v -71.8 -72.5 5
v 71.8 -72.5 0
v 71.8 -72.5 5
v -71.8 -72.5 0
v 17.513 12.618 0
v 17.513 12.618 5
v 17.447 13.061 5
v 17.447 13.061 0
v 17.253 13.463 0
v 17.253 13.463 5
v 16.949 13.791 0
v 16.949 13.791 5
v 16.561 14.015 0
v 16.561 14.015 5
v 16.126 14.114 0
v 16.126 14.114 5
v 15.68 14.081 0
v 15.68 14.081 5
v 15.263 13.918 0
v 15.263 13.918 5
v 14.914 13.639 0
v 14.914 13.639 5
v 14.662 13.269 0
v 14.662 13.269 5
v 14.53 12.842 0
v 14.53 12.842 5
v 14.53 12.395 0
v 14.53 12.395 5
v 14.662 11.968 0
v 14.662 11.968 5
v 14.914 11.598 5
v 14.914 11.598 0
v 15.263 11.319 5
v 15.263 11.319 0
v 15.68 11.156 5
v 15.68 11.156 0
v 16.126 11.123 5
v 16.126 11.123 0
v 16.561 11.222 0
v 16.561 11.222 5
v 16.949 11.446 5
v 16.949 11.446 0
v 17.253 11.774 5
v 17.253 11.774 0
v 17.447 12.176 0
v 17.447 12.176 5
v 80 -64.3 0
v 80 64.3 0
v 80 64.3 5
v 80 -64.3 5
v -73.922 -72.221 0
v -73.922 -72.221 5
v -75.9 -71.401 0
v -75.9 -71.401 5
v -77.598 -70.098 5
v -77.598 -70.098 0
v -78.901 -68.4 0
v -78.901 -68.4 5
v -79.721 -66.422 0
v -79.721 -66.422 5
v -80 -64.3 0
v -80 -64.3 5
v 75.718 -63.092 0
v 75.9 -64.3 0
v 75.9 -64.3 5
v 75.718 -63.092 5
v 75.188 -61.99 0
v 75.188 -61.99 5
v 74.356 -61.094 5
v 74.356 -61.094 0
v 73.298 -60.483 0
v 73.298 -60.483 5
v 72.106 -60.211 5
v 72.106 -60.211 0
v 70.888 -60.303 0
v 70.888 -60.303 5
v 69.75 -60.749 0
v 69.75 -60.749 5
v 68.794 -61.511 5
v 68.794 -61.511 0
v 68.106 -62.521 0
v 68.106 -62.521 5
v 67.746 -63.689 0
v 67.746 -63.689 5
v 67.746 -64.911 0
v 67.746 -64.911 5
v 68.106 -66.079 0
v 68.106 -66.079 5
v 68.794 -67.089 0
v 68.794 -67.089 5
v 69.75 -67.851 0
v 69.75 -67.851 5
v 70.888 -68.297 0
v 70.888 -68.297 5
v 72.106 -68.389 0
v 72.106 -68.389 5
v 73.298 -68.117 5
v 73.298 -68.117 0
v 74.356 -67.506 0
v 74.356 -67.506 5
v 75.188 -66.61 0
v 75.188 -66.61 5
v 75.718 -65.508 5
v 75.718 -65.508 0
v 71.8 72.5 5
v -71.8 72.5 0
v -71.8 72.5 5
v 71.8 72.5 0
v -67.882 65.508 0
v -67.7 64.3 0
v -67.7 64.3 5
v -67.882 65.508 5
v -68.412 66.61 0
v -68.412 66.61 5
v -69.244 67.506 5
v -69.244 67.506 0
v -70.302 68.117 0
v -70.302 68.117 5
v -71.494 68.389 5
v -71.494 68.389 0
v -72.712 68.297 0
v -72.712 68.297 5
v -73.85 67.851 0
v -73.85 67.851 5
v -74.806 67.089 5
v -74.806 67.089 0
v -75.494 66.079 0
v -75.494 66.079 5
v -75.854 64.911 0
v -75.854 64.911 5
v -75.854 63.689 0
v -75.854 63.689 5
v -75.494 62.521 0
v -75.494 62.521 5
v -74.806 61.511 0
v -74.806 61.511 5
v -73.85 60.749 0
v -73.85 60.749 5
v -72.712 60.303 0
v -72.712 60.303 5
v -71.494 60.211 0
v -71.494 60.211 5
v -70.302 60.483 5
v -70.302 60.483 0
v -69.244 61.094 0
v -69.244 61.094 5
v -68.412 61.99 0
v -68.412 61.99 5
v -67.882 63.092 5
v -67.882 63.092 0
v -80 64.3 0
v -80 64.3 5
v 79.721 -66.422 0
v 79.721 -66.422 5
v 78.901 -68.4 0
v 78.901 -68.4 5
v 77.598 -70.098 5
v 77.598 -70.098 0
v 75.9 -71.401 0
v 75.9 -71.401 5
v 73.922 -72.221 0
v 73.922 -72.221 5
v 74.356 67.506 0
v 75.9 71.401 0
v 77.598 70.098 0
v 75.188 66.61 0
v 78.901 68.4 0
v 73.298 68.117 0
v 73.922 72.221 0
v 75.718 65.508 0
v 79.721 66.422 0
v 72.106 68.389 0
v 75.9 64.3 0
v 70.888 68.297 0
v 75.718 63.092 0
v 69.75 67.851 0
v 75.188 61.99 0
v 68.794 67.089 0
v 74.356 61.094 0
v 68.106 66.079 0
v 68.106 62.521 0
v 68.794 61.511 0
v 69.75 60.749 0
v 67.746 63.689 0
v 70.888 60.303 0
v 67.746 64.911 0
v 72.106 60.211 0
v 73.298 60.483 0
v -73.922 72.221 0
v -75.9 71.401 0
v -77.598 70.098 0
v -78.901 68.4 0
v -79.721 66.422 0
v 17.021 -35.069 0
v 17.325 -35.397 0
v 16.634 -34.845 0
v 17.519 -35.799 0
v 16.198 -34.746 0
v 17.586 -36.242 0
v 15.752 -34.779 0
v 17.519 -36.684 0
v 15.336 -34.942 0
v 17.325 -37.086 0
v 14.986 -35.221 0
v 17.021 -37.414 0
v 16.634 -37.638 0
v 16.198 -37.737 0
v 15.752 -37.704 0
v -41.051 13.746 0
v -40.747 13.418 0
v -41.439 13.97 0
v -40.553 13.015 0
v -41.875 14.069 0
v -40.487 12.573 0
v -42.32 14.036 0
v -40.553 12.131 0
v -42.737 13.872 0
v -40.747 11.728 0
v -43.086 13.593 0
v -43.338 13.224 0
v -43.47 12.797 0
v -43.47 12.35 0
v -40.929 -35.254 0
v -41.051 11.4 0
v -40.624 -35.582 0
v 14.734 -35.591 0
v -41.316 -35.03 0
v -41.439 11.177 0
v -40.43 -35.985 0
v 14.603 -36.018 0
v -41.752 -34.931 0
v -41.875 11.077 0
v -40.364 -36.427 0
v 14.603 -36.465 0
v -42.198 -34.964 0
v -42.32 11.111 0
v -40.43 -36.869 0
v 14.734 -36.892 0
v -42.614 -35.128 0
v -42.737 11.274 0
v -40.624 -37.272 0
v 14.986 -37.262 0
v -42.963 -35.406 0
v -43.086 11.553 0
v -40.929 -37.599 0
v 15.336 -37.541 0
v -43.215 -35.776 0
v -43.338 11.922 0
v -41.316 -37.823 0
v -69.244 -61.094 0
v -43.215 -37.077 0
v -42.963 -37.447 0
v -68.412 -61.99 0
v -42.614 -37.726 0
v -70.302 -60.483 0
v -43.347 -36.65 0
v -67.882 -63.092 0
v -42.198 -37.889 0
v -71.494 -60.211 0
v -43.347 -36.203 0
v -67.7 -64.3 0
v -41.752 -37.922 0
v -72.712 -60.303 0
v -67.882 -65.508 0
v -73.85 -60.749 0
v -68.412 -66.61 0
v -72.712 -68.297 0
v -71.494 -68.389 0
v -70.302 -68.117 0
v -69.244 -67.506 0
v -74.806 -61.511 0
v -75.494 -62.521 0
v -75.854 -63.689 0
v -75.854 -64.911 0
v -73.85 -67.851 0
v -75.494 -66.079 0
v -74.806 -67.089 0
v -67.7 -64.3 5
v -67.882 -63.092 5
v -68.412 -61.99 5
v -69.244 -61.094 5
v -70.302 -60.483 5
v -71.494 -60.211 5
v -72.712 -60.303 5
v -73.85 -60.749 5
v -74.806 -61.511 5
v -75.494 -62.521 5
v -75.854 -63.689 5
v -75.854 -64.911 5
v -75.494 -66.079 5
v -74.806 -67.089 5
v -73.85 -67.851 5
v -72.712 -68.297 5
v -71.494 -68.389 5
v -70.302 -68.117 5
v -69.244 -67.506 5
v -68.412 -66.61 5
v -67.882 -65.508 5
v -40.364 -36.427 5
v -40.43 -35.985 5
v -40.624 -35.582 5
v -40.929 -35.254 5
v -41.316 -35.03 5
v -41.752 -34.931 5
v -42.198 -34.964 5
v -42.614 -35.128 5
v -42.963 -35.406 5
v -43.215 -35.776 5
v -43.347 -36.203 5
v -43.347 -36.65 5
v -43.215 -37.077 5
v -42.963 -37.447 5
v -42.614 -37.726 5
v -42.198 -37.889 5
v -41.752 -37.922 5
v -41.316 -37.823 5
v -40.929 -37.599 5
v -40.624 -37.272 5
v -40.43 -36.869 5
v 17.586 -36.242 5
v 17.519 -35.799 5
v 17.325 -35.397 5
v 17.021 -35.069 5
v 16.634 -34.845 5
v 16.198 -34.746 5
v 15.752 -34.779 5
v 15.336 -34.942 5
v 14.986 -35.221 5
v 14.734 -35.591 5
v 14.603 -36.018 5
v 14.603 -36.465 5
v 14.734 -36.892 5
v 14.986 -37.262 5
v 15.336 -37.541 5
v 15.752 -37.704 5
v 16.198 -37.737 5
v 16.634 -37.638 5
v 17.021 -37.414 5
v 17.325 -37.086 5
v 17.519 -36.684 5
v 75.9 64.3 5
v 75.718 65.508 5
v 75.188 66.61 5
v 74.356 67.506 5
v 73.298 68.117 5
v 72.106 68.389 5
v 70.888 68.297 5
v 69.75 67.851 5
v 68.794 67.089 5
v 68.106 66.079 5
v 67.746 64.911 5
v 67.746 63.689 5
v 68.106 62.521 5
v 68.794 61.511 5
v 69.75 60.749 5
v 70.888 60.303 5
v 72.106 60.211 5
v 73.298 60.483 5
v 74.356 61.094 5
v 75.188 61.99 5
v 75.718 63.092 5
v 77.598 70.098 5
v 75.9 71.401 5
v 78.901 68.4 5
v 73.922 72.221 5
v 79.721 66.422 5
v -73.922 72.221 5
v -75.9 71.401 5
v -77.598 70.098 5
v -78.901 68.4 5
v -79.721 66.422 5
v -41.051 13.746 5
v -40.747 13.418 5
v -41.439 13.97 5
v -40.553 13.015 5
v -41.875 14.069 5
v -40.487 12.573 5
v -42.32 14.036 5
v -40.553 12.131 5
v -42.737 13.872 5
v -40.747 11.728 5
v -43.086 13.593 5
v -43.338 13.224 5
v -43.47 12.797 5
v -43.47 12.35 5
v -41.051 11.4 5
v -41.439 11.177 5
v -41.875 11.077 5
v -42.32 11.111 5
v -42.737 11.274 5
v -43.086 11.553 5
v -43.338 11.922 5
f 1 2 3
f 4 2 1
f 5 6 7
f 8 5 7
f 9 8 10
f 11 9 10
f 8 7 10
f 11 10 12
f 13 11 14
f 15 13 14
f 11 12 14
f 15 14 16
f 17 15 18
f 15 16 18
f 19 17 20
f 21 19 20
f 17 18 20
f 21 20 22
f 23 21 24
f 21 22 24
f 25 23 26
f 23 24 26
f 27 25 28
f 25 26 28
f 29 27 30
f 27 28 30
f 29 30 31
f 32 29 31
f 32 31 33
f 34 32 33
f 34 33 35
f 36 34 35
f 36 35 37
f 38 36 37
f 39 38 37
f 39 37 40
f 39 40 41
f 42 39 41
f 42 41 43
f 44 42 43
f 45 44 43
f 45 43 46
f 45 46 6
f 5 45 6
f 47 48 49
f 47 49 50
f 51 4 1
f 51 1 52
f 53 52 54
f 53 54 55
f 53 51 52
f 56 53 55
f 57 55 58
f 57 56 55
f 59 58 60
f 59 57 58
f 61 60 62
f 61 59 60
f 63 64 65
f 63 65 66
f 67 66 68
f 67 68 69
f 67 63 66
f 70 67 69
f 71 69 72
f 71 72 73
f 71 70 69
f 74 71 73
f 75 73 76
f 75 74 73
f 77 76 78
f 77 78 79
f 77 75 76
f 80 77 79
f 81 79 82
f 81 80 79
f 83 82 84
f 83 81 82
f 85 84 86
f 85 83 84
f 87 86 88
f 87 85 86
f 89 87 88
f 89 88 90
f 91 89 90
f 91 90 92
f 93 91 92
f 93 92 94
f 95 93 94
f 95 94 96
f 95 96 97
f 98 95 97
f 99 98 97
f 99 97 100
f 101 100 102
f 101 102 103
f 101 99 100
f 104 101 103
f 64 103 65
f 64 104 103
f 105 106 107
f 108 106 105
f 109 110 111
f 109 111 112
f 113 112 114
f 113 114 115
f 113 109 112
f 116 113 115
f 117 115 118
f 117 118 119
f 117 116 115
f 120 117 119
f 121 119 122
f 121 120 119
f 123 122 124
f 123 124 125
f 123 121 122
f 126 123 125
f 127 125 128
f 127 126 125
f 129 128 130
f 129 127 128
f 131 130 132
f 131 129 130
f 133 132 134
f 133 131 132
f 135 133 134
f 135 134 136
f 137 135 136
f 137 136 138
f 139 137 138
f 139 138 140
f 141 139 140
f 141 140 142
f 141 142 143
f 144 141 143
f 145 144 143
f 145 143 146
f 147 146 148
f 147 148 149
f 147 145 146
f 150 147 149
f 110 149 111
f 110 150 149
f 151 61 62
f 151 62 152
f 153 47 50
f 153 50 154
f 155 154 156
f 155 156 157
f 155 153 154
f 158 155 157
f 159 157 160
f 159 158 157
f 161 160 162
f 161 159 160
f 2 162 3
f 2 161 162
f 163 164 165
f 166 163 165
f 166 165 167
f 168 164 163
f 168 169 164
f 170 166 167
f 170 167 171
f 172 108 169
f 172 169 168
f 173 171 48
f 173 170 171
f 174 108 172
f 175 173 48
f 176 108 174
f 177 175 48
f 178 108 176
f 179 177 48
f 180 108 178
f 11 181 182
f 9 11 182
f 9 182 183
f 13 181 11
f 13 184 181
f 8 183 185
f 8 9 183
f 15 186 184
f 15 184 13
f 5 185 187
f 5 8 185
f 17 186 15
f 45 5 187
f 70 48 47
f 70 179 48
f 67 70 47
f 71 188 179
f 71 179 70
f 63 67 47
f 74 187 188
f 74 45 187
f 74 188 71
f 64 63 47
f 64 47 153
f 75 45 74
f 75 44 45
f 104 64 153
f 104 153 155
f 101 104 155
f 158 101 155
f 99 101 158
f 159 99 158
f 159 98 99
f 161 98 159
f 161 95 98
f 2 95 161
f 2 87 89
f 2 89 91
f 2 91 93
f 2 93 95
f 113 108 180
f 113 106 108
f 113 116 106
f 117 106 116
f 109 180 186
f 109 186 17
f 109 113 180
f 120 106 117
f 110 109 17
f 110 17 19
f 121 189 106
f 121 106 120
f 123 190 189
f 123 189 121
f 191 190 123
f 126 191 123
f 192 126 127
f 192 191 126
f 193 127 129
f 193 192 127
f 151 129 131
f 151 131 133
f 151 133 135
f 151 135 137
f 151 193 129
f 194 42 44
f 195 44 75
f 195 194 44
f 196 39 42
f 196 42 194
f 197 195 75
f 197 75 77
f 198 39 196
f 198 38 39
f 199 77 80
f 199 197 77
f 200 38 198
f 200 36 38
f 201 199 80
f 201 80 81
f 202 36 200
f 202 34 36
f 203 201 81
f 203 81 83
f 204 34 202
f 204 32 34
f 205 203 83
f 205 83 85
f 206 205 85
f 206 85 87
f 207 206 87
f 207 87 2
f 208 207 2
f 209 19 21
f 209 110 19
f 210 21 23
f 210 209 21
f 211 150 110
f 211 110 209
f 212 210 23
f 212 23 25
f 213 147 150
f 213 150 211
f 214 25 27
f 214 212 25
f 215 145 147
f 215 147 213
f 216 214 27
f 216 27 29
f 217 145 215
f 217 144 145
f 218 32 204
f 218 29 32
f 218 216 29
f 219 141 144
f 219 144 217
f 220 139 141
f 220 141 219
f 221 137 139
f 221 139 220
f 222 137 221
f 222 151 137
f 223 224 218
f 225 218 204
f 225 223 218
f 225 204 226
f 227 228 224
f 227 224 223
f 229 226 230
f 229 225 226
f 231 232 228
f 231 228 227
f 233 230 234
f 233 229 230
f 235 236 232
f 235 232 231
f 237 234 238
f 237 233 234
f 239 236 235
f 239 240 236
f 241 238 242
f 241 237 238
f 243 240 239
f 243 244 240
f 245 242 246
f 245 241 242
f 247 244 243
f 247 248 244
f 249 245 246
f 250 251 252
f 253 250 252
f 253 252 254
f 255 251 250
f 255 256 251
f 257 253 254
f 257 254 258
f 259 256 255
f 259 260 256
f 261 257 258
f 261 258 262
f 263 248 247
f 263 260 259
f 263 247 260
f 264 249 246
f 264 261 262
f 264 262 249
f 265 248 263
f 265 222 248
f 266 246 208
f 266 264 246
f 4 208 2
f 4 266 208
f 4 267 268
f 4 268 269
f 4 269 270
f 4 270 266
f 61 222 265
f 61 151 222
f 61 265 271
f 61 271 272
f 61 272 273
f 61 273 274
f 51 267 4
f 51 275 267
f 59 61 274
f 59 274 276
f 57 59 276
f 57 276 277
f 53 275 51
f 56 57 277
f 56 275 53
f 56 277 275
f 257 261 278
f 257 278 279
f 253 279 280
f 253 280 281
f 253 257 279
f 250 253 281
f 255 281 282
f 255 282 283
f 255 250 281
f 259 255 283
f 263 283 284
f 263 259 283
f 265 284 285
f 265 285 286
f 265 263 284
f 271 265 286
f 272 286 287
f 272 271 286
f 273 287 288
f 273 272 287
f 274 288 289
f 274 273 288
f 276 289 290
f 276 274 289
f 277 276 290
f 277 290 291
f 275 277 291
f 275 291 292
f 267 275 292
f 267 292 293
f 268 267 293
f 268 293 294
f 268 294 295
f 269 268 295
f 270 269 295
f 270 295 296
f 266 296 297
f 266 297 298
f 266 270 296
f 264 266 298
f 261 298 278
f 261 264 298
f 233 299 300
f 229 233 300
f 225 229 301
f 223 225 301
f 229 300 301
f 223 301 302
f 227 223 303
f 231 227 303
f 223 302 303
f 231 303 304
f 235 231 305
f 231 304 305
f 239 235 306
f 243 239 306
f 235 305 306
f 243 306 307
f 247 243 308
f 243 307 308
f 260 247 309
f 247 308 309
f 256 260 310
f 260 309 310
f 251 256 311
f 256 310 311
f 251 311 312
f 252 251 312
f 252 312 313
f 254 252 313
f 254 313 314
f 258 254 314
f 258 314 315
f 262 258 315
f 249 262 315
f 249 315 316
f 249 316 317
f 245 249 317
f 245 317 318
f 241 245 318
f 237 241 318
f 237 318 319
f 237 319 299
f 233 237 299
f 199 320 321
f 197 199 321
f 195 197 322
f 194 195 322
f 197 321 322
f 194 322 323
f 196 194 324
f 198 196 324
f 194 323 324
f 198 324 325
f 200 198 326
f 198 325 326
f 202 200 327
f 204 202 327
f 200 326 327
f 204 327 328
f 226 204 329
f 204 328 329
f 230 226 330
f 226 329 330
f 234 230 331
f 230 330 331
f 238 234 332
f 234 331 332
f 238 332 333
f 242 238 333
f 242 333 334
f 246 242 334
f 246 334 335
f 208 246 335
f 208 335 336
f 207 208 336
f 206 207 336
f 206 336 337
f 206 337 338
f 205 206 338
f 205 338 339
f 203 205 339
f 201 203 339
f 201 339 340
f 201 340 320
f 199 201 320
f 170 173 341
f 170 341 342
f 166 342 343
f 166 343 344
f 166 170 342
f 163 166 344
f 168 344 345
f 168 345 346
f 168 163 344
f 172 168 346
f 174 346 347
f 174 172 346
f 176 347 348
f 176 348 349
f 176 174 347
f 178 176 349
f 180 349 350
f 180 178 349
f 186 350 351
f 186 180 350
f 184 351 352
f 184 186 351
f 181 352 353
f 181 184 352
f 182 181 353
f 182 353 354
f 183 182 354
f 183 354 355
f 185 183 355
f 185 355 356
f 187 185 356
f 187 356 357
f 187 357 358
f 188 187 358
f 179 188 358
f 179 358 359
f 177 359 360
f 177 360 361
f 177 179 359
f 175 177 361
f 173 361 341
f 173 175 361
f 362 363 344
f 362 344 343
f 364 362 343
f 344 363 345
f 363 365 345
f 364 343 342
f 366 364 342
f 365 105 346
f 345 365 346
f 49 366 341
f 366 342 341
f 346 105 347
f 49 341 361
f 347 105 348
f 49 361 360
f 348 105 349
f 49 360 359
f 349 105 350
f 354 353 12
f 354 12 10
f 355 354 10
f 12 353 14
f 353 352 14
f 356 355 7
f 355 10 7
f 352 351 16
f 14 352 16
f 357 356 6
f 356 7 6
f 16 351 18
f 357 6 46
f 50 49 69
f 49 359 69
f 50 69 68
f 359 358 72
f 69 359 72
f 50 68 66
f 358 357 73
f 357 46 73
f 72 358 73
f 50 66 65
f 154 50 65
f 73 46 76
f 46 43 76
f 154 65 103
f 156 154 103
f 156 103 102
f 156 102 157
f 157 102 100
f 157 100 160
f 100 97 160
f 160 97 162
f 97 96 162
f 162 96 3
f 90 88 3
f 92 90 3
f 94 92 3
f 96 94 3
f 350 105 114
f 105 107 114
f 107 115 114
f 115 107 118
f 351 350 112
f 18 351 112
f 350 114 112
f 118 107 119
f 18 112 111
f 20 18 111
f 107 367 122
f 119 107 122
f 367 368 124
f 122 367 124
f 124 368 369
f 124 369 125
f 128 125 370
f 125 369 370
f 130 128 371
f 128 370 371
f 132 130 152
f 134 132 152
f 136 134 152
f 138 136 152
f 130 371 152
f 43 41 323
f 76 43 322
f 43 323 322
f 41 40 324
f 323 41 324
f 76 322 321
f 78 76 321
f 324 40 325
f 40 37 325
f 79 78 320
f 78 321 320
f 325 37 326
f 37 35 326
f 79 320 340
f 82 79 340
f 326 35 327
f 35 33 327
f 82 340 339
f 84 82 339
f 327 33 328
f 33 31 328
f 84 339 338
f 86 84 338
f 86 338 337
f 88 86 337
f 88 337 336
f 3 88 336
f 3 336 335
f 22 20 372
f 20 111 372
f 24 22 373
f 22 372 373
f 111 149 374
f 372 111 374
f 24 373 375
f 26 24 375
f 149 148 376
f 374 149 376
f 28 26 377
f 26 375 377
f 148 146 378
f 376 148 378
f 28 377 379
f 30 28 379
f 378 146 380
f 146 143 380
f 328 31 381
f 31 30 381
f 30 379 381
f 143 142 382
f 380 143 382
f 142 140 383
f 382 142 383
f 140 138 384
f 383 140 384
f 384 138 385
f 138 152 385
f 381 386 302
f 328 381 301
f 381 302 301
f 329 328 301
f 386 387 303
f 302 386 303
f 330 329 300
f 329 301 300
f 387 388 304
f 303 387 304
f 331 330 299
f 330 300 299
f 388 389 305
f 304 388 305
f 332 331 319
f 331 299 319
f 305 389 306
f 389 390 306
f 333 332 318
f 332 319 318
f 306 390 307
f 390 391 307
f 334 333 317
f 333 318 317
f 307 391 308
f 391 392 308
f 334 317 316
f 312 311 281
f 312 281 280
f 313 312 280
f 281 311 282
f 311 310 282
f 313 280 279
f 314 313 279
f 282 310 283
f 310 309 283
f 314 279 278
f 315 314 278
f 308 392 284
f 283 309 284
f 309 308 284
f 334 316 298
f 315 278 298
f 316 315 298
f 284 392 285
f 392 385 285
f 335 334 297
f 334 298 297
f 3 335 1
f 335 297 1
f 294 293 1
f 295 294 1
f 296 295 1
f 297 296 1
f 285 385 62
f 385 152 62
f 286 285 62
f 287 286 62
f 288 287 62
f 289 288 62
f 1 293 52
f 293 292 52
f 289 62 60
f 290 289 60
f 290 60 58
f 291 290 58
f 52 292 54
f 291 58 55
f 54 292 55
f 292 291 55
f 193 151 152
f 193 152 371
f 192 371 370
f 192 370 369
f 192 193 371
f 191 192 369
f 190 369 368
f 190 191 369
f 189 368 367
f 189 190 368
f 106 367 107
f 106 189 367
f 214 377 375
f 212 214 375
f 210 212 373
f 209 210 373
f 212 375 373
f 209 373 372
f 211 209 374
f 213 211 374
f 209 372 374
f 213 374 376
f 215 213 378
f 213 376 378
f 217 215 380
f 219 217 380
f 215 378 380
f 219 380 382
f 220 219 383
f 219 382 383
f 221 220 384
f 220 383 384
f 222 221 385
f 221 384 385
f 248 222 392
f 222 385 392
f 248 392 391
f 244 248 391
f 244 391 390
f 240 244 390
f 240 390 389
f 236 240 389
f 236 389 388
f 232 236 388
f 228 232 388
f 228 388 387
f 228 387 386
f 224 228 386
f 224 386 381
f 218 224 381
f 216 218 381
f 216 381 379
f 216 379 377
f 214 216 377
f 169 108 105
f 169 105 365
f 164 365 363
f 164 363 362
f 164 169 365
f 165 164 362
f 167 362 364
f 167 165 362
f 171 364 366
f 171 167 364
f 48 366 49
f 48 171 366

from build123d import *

# Parameters (mm, degrees)
CROQUIS1_R              = 4.1
SALIENTE_EXTRUIR1_DEPTH = 5
CROQUIS2_R              = 1.5
CORTAR_EXTRUIR1_DEPTH   = 10


with BuildPart() as part:
    # Croquis1 → Saliente-Extruir1 (new body)
    with BuildSketch(Plane(origin=(0, 0, 0), x_dir=(0, 1, 0), z_dir=(0, 0, 1))):
        with BuildLine():
            ThreePointArc((-72.5, 71.8), (-70.098275606, 77.598275606), (-64.3, 80))
            Line((-64.3, 80), (64.3, 80))
            ThreePointArc((64.3, 80), (70.098275606, 77.598275606), (72.5, 71.8))
            Line((72.5, 71.8), (72.5, -71.8))
            ThreePointArc((72.5, -71.8), (70.098275606, -77.598275606), (64.3, -80))
            Line((64.3, -80), (-64.3, -80))
            ThreePointArc((-64.3, -80), (-70.098275606, -77.598275606), (-72.5, -71.8))
            Line((-72.5, -71.8), (-72.5, 71.8))
        make_face()
        with Locations(Location((-64.3, -71.8, 0), (0, 0, 270))):
            Circle(CROQUIS1_R, mode=Mode.SUBTRACT)
        with Locations(Location((64.3, -71.8, 0), (0, 0, 270))):
            Circle(CROQUIS1_R, mode=Mode.SUBTRACT)
        with Locations(Location((64.3, 71.8, 0), (0, 0, 270))):
            Circle(CROQUIS1_R, mode=Mode.SUBTRACT)
        with Locations(Location((-64.3, 71.8, 0), (0, 0, 270))):
            Circle(CROQUIS1_R, mode=Mode.SUBTRACT)
    extrude(amount=SALIENTE_EXTRUIR1_DEPTH)

    # Croquis2 → Cortar-Extruir1 (cut)
    with BuildSketch(Plane(origin=(0, 0, 5), x_dir=(0, -1, 0), z_dir=(0, 0, 1))):
        with Locations(Location((-12.573190408, -41.986630744, 0), (0, 0, 90))):
            Circle(CROQUIS2_R)
        with Locations(Location((-12.618499373, 16.013437897, 0), (0, 0, 90))):
            Circle(CROQUIS2_R)
        with Locations(Location((36.241518275, 16.085874272, 0), (0, 0, 90))):
            Circle(CROQUIS2_R)
        with Locations(Location((36.426655653, -41.863805612, 0), (0, 0, 90))):
            Circle(CROQUIS2_R)
    extrude(amount=-CORTAR_EXTRUIR1_DEPTH, mode=Mode.SUBTRACT)


solid = part.part
